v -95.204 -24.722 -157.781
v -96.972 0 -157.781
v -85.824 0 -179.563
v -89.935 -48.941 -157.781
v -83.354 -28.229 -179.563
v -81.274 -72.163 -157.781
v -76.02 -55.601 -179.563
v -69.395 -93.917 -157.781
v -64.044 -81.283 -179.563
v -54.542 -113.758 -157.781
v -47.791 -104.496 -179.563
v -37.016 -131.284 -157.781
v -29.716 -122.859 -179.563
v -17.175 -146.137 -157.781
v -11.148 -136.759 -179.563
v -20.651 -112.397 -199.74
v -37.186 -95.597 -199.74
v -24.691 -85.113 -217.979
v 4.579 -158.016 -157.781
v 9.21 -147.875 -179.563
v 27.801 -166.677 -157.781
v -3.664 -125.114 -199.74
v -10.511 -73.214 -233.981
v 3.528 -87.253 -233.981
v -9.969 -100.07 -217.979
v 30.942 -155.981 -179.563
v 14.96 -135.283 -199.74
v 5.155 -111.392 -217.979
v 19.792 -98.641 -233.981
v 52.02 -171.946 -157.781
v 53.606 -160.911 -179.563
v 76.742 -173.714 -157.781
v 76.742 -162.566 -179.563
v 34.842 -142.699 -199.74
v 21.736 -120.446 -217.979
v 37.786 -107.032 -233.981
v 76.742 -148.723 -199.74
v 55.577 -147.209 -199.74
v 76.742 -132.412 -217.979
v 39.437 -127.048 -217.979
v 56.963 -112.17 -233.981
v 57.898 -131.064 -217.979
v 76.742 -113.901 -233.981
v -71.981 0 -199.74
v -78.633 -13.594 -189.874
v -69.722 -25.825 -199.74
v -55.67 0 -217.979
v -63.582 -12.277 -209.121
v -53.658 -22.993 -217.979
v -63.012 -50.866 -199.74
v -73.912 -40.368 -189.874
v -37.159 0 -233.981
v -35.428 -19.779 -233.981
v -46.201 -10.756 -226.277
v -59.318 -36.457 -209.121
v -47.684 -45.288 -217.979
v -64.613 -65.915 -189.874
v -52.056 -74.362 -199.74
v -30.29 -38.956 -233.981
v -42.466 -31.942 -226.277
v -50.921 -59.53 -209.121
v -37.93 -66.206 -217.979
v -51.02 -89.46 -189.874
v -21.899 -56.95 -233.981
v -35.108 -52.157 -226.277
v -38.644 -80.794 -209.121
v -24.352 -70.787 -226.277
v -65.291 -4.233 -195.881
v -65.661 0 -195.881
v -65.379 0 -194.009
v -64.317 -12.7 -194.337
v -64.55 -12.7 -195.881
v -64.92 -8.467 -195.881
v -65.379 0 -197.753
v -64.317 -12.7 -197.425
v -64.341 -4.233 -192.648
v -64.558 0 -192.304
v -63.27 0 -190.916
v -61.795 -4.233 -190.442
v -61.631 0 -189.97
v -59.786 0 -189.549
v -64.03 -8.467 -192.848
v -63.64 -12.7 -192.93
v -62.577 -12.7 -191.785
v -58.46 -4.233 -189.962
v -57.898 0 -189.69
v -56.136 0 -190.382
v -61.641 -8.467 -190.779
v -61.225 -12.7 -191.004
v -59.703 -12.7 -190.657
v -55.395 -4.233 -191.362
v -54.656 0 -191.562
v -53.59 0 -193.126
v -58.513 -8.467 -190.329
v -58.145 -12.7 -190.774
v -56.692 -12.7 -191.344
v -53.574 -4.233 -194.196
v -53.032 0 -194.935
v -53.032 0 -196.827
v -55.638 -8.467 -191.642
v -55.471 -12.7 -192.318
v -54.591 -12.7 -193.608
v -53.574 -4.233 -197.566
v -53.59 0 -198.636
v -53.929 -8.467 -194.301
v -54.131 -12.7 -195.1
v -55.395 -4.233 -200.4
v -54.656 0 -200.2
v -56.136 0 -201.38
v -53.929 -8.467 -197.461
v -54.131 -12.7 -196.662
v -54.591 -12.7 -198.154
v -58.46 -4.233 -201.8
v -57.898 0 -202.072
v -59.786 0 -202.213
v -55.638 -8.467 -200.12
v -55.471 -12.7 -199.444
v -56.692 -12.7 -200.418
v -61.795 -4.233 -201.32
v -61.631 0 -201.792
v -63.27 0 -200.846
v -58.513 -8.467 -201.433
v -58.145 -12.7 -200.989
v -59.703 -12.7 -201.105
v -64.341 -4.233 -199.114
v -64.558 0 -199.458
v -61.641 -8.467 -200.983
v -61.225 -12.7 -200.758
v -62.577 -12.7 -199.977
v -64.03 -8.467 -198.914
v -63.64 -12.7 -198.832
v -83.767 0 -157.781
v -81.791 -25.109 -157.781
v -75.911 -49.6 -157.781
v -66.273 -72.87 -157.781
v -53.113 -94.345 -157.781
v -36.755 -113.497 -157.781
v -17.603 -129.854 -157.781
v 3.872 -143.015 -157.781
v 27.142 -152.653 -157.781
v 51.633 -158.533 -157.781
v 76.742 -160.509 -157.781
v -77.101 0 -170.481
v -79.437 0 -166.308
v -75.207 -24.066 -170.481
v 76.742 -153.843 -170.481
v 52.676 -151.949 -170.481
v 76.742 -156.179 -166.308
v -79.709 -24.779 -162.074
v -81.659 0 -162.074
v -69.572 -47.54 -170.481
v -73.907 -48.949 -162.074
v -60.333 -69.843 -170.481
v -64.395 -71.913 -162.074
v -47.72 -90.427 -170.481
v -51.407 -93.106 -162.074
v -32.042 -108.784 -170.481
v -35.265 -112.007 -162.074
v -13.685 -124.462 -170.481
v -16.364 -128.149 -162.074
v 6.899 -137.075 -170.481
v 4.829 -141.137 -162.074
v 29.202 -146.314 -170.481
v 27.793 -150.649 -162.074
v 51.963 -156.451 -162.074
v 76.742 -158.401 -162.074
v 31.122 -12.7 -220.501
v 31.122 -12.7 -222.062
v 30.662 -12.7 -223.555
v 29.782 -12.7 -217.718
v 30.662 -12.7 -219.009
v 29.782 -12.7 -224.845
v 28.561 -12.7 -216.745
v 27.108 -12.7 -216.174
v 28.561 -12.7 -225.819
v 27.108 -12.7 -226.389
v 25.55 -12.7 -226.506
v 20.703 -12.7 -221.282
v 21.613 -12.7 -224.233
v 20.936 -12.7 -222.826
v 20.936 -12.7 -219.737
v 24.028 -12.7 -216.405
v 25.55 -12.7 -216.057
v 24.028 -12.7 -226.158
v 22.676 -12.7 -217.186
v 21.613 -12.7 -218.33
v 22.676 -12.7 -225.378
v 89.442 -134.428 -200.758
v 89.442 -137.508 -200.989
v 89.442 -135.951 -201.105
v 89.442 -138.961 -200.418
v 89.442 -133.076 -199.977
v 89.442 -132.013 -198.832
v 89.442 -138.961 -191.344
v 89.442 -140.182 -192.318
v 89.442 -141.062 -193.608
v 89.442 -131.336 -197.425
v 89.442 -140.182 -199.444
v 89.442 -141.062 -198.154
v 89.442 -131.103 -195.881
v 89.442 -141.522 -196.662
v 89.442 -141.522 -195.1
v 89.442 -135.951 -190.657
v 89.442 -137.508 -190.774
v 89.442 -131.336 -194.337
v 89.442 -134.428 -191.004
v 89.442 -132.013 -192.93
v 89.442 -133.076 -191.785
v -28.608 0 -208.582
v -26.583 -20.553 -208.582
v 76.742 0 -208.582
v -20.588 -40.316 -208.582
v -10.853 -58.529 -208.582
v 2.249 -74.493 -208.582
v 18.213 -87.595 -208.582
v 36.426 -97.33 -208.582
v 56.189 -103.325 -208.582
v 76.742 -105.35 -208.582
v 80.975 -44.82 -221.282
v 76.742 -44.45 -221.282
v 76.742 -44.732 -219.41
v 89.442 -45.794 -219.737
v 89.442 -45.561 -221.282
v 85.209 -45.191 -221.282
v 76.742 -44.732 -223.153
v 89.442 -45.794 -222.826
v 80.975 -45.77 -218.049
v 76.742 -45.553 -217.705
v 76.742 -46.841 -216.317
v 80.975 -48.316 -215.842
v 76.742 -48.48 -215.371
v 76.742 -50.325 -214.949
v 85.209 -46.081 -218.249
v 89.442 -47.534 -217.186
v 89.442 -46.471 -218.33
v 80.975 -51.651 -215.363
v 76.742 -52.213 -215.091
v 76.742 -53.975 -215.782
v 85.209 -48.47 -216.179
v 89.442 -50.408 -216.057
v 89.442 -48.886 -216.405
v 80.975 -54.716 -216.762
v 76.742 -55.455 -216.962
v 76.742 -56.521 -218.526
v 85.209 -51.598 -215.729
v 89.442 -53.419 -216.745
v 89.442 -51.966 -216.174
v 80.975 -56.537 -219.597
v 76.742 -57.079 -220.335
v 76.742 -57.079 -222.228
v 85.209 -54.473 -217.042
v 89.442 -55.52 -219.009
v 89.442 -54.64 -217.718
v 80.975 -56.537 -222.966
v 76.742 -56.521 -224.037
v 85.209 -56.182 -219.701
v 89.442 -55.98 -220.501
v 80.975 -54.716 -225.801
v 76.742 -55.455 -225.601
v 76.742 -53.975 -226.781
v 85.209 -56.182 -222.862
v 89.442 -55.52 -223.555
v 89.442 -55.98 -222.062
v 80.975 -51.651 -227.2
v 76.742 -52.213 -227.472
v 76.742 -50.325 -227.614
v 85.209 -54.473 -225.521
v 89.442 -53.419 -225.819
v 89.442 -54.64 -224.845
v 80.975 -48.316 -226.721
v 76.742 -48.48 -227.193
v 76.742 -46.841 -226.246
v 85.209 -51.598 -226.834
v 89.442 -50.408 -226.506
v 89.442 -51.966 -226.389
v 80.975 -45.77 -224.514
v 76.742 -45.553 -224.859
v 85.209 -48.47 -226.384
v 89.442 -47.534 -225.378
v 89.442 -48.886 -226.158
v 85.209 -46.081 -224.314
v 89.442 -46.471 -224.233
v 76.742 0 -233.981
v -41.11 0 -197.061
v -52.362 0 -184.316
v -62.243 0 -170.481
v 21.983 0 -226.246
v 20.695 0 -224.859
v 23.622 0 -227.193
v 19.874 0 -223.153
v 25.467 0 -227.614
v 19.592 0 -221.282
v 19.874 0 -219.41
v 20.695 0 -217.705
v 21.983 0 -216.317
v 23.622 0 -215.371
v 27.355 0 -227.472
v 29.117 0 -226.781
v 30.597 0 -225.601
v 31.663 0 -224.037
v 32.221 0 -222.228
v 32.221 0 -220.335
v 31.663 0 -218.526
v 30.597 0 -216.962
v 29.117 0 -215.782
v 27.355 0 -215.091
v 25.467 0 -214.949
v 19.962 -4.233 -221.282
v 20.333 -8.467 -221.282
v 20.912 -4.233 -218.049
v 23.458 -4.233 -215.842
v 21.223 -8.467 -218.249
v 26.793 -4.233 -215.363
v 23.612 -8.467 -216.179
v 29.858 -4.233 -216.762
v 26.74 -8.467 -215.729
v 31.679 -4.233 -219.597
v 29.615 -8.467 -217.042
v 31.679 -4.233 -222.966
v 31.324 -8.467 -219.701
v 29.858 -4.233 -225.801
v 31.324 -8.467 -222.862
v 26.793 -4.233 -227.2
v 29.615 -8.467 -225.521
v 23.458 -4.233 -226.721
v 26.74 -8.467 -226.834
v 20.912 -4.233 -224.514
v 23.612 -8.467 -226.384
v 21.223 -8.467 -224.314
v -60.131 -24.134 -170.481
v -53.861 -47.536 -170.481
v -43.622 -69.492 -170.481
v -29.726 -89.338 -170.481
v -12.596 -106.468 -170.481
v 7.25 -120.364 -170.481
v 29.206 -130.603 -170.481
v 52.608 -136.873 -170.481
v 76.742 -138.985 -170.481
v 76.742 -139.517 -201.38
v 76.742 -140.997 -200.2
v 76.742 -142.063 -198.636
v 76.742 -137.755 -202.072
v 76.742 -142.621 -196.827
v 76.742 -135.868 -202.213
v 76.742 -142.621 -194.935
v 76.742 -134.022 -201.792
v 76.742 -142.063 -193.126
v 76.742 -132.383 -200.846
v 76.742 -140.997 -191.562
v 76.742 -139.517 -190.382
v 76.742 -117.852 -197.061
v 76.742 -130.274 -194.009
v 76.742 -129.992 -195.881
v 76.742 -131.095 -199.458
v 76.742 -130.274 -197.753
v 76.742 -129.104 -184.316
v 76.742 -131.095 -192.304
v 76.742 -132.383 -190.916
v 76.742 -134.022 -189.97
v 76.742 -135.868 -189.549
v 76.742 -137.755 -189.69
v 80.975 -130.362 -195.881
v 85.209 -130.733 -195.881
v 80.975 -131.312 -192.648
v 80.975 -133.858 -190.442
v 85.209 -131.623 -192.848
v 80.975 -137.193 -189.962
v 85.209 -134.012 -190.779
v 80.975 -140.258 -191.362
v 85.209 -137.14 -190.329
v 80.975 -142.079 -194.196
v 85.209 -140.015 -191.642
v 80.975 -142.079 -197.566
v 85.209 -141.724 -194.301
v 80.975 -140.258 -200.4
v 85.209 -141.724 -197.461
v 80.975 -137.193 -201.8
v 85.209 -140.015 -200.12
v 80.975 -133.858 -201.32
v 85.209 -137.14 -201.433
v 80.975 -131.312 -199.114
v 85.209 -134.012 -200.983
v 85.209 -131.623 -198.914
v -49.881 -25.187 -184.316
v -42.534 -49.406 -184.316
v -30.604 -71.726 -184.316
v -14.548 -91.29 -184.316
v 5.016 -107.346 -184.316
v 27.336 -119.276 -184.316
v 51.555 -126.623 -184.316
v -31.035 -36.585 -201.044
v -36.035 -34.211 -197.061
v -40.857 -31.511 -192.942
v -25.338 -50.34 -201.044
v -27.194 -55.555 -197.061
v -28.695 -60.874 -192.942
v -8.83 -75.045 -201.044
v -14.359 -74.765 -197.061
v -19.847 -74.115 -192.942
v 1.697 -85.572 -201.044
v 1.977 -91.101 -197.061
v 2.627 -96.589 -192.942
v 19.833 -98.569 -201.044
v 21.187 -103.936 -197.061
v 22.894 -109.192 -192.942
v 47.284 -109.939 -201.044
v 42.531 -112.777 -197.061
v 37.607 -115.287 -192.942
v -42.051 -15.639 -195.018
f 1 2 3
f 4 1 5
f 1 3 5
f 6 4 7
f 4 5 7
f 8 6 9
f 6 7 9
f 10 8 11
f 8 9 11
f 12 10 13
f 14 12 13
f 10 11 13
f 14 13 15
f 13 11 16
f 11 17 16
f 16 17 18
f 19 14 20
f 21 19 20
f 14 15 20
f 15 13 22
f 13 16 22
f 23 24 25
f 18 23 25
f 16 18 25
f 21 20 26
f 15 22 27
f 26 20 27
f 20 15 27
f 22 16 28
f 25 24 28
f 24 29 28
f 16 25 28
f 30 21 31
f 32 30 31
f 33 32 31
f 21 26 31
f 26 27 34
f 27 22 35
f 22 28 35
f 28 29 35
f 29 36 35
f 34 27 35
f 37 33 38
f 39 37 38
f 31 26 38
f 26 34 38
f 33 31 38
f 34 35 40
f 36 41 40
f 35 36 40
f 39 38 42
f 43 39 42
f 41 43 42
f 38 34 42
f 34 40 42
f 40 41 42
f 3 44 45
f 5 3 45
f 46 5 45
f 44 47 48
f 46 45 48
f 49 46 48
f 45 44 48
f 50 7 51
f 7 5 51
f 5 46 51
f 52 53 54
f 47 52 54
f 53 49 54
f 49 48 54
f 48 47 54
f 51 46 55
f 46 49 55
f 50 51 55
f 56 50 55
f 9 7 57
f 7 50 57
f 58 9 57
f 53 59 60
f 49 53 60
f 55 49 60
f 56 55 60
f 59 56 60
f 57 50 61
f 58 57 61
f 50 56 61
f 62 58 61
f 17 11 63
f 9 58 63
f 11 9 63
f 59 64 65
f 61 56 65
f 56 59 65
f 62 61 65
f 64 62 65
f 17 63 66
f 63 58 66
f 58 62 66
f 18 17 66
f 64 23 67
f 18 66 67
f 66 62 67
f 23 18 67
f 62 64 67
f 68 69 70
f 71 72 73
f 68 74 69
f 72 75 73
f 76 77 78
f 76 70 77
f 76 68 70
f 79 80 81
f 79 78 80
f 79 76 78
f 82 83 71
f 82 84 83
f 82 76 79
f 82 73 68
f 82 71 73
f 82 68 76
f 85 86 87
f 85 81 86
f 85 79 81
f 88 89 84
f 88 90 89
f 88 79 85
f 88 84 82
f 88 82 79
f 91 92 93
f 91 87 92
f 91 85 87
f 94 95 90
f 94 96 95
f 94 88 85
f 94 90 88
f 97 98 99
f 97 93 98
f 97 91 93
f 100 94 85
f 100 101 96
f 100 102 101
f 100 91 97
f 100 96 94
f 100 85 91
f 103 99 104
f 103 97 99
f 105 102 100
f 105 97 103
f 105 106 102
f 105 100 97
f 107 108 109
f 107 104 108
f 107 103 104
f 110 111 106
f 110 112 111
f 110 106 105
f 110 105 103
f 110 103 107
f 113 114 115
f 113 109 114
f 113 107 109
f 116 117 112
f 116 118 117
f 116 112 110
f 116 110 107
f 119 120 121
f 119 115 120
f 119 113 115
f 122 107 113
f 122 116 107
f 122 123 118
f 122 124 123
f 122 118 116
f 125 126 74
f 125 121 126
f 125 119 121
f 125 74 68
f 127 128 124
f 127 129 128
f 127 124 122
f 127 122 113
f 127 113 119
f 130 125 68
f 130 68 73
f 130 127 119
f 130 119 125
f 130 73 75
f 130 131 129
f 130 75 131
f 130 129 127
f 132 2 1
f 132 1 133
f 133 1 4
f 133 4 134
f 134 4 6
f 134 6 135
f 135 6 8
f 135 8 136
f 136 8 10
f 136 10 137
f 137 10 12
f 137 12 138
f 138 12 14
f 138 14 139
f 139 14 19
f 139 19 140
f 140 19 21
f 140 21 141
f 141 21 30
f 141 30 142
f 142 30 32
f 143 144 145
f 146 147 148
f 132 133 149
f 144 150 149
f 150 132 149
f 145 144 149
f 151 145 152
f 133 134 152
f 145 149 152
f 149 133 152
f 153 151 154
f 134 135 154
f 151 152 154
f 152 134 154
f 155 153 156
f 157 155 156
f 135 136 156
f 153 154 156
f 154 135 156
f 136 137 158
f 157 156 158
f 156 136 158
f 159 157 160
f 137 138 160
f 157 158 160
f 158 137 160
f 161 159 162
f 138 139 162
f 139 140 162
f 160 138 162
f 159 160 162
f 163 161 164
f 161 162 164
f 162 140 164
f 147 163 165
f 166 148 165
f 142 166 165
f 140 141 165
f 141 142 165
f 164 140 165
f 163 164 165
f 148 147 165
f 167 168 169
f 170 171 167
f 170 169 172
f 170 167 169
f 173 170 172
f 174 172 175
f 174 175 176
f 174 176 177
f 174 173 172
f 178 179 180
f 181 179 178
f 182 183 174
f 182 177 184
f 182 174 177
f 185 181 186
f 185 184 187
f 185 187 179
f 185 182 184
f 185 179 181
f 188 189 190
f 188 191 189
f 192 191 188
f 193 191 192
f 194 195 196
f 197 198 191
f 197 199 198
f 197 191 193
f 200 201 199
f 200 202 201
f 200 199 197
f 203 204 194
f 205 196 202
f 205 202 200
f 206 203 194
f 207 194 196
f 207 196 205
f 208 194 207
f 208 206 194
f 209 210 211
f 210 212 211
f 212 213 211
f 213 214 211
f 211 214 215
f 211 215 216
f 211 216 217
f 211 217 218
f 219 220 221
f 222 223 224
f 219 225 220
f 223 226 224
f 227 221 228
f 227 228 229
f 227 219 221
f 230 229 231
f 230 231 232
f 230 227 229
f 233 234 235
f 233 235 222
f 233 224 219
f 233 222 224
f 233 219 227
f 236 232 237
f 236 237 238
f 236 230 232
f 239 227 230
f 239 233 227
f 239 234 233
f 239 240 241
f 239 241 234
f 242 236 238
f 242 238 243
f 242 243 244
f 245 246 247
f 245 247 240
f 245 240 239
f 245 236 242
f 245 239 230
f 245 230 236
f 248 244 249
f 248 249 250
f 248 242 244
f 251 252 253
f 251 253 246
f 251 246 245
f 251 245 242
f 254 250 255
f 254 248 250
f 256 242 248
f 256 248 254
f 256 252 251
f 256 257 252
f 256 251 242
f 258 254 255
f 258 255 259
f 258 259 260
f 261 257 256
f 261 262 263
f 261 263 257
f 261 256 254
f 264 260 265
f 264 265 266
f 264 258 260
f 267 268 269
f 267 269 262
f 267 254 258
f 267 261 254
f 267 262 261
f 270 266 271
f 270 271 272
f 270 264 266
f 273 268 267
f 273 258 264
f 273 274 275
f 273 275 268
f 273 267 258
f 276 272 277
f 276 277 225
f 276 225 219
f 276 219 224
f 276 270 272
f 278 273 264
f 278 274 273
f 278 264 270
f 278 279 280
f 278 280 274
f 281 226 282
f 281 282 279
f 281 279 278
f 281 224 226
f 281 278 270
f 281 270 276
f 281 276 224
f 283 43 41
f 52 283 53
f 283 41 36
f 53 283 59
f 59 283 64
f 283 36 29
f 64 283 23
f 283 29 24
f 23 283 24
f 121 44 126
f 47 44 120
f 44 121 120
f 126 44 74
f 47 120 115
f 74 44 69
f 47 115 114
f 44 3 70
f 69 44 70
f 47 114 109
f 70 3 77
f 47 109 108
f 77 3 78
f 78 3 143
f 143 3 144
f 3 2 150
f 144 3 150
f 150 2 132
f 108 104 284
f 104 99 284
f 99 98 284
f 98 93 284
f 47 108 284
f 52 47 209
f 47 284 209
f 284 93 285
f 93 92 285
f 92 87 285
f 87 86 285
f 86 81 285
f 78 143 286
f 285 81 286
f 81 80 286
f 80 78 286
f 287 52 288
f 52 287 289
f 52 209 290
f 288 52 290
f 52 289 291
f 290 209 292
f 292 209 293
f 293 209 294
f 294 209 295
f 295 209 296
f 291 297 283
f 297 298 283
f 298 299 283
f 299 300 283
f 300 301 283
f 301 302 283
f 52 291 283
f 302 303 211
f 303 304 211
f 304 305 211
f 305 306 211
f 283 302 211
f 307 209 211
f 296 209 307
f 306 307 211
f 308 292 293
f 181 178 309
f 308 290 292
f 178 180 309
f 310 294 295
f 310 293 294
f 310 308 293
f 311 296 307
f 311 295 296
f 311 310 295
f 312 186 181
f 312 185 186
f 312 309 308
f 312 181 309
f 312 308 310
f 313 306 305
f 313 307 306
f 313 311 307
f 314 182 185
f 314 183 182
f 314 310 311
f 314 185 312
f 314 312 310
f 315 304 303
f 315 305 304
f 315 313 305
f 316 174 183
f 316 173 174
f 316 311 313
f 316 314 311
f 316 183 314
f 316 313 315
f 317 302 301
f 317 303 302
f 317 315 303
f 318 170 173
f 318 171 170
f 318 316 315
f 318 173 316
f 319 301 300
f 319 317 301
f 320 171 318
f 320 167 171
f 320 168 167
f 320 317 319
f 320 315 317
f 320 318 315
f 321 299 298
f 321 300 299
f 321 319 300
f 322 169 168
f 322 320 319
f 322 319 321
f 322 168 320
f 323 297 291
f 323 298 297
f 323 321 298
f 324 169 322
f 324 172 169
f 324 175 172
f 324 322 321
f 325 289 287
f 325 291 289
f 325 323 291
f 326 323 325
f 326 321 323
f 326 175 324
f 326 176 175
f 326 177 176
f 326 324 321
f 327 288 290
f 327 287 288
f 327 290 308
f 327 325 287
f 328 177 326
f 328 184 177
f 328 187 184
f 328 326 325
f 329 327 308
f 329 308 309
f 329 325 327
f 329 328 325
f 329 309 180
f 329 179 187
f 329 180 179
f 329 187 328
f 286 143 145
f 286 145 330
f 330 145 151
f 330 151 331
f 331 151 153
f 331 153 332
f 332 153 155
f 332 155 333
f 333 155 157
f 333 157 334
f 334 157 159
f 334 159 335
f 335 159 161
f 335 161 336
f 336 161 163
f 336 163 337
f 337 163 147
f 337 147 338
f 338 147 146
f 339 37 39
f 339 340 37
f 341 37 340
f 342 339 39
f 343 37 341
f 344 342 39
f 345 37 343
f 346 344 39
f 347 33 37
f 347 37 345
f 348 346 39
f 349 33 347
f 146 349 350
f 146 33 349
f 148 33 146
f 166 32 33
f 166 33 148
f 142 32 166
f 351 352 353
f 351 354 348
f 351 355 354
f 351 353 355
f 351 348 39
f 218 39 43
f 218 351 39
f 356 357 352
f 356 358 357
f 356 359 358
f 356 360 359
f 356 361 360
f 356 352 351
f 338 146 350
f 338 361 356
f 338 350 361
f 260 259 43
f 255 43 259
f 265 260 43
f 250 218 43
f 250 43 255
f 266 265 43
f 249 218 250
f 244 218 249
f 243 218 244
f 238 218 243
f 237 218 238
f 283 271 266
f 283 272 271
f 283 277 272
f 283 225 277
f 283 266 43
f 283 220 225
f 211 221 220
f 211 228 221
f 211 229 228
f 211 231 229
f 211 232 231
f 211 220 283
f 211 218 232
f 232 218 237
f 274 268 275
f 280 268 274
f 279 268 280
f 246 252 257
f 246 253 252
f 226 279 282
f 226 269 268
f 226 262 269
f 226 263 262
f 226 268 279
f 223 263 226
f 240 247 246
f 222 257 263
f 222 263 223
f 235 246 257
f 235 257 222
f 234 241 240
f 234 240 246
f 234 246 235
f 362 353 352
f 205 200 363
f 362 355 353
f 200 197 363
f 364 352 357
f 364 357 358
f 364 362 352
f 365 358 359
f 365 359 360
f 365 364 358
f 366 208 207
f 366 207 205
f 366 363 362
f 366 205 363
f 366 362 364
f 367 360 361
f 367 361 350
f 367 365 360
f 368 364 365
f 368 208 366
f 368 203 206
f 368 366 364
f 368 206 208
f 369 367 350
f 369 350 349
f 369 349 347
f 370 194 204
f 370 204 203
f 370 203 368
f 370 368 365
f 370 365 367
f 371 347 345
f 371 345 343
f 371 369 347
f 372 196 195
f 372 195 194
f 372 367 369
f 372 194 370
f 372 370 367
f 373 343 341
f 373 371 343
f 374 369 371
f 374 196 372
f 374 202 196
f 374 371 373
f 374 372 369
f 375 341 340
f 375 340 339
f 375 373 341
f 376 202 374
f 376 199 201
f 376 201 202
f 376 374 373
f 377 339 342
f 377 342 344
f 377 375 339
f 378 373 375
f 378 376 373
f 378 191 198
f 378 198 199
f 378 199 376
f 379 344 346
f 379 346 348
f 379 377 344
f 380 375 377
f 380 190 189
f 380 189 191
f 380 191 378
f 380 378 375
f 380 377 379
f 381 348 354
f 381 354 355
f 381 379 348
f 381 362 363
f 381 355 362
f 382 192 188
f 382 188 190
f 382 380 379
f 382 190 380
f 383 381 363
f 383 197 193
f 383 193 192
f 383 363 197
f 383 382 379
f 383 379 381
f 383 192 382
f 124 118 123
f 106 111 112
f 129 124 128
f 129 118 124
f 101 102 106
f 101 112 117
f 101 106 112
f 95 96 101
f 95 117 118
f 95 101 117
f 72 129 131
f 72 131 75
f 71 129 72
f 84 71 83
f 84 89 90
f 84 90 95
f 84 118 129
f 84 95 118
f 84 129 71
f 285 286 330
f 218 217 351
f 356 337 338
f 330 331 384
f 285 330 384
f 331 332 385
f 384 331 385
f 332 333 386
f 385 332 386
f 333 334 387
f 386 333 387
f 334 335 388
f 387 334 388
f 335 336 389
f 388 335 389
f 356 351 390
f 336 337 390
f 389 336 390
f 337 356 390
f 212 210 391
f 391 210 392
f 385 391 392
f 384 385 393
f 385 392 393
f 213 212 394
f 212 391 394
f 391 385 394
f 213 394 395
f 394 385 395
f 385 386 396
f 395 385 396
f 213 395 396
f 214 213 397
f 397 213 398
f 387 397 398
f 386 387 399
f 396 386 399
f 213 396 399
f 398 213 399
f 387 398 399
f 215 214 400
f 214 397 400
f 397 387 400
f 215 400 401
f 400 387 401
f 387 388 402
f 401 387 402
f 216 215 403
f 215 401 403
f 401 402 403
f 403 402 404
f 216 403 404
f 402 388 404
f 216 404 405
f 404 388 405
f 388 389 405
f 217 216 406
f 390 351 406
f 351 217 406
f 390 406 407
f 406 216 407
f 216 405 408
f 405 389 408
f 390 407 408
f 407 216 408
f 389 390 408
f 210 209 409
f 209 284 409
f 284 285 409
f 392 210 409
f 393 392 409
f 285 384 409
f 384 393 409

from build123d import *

# Parameters (mm, degrees)
F1_ANGLE = 90
F2_R     = 6.35
F3_DEPTH = 12.7
F3_TAPER = 5
F4_R     = 6.35
F5_DEPTH = 12.7
F5_TAPER = 5


with BuildPart() as f1:
    # F0 (on Front) → F1 (revolve)
    with BuildSketch(Plane.XZ):
        with BuildLine():
            ThreePointArc((-77.1013106813, -170.4810645103), (-80.5622641491, -164.1983062461), (-83.7669886019, -157.7810645103))
            Line((-83.7669886019, -157.7810645103), (-96.971668303, -157.7810645103))
            ThreePointArc((-96.971668303, -157.7810645103), (-71.9810472081, -199.7397034229), (-37.1588170528, -233.9810645103))
            Line((-37.1588170528, -233.9810645103), (76.7419968518, -233.9810645103))
            Line((76.7419968518, -233.9810645103), (76.7419968518, -208.5815945789))
            Line((76.7419968518, -208.5815945789), (-28.6076346844, -208.5815945789))
            ThreePointArc((-28.6076346844, -208.5815945789), (-46.9000470933, -190.8333294487), (-62.2427515075, -170.4810645103))
            Line((-62.2427515075, -170.4810645103), (-77.1013106813, -170.4810645103))
        make_face()
    revolve(axis=Axis((76.7419968518, 0, -221.2813295446), (0, 0, 1)), revolution_arc=F1_ANGLE)

    # F2 (on face) → F3 (join)
    with BuildSketch(Plane.YZ.offset(76.7419968518)):
        with Locations((-136.3420439451, -195.8810645103)):
            Circle(F2_R)
        with Locations((-50.7999999993, -221.2815945789)):
            Circle(F2_R)
    extrude(amount=F3_DEPTH, taper=F3_TAPER)

    # F4 (on face) → F5 (cut)
    with BuildSketch(Plane(origin=(0, 0, 0), x_dir=(-1, 0, 0), z_dir=(0, 1, 0))):
        with Locations((-25.9419968518, -221.2815945789)):
            Circle(F4_R)
        with Locations((59.3110422283, -195.8810645103)):
            Circle(F4_R)
    extrude(amount=-F5_DEPTH, taper=F5_TAPER, mode=Mode.SUBTRACT)


solid = f1.part
